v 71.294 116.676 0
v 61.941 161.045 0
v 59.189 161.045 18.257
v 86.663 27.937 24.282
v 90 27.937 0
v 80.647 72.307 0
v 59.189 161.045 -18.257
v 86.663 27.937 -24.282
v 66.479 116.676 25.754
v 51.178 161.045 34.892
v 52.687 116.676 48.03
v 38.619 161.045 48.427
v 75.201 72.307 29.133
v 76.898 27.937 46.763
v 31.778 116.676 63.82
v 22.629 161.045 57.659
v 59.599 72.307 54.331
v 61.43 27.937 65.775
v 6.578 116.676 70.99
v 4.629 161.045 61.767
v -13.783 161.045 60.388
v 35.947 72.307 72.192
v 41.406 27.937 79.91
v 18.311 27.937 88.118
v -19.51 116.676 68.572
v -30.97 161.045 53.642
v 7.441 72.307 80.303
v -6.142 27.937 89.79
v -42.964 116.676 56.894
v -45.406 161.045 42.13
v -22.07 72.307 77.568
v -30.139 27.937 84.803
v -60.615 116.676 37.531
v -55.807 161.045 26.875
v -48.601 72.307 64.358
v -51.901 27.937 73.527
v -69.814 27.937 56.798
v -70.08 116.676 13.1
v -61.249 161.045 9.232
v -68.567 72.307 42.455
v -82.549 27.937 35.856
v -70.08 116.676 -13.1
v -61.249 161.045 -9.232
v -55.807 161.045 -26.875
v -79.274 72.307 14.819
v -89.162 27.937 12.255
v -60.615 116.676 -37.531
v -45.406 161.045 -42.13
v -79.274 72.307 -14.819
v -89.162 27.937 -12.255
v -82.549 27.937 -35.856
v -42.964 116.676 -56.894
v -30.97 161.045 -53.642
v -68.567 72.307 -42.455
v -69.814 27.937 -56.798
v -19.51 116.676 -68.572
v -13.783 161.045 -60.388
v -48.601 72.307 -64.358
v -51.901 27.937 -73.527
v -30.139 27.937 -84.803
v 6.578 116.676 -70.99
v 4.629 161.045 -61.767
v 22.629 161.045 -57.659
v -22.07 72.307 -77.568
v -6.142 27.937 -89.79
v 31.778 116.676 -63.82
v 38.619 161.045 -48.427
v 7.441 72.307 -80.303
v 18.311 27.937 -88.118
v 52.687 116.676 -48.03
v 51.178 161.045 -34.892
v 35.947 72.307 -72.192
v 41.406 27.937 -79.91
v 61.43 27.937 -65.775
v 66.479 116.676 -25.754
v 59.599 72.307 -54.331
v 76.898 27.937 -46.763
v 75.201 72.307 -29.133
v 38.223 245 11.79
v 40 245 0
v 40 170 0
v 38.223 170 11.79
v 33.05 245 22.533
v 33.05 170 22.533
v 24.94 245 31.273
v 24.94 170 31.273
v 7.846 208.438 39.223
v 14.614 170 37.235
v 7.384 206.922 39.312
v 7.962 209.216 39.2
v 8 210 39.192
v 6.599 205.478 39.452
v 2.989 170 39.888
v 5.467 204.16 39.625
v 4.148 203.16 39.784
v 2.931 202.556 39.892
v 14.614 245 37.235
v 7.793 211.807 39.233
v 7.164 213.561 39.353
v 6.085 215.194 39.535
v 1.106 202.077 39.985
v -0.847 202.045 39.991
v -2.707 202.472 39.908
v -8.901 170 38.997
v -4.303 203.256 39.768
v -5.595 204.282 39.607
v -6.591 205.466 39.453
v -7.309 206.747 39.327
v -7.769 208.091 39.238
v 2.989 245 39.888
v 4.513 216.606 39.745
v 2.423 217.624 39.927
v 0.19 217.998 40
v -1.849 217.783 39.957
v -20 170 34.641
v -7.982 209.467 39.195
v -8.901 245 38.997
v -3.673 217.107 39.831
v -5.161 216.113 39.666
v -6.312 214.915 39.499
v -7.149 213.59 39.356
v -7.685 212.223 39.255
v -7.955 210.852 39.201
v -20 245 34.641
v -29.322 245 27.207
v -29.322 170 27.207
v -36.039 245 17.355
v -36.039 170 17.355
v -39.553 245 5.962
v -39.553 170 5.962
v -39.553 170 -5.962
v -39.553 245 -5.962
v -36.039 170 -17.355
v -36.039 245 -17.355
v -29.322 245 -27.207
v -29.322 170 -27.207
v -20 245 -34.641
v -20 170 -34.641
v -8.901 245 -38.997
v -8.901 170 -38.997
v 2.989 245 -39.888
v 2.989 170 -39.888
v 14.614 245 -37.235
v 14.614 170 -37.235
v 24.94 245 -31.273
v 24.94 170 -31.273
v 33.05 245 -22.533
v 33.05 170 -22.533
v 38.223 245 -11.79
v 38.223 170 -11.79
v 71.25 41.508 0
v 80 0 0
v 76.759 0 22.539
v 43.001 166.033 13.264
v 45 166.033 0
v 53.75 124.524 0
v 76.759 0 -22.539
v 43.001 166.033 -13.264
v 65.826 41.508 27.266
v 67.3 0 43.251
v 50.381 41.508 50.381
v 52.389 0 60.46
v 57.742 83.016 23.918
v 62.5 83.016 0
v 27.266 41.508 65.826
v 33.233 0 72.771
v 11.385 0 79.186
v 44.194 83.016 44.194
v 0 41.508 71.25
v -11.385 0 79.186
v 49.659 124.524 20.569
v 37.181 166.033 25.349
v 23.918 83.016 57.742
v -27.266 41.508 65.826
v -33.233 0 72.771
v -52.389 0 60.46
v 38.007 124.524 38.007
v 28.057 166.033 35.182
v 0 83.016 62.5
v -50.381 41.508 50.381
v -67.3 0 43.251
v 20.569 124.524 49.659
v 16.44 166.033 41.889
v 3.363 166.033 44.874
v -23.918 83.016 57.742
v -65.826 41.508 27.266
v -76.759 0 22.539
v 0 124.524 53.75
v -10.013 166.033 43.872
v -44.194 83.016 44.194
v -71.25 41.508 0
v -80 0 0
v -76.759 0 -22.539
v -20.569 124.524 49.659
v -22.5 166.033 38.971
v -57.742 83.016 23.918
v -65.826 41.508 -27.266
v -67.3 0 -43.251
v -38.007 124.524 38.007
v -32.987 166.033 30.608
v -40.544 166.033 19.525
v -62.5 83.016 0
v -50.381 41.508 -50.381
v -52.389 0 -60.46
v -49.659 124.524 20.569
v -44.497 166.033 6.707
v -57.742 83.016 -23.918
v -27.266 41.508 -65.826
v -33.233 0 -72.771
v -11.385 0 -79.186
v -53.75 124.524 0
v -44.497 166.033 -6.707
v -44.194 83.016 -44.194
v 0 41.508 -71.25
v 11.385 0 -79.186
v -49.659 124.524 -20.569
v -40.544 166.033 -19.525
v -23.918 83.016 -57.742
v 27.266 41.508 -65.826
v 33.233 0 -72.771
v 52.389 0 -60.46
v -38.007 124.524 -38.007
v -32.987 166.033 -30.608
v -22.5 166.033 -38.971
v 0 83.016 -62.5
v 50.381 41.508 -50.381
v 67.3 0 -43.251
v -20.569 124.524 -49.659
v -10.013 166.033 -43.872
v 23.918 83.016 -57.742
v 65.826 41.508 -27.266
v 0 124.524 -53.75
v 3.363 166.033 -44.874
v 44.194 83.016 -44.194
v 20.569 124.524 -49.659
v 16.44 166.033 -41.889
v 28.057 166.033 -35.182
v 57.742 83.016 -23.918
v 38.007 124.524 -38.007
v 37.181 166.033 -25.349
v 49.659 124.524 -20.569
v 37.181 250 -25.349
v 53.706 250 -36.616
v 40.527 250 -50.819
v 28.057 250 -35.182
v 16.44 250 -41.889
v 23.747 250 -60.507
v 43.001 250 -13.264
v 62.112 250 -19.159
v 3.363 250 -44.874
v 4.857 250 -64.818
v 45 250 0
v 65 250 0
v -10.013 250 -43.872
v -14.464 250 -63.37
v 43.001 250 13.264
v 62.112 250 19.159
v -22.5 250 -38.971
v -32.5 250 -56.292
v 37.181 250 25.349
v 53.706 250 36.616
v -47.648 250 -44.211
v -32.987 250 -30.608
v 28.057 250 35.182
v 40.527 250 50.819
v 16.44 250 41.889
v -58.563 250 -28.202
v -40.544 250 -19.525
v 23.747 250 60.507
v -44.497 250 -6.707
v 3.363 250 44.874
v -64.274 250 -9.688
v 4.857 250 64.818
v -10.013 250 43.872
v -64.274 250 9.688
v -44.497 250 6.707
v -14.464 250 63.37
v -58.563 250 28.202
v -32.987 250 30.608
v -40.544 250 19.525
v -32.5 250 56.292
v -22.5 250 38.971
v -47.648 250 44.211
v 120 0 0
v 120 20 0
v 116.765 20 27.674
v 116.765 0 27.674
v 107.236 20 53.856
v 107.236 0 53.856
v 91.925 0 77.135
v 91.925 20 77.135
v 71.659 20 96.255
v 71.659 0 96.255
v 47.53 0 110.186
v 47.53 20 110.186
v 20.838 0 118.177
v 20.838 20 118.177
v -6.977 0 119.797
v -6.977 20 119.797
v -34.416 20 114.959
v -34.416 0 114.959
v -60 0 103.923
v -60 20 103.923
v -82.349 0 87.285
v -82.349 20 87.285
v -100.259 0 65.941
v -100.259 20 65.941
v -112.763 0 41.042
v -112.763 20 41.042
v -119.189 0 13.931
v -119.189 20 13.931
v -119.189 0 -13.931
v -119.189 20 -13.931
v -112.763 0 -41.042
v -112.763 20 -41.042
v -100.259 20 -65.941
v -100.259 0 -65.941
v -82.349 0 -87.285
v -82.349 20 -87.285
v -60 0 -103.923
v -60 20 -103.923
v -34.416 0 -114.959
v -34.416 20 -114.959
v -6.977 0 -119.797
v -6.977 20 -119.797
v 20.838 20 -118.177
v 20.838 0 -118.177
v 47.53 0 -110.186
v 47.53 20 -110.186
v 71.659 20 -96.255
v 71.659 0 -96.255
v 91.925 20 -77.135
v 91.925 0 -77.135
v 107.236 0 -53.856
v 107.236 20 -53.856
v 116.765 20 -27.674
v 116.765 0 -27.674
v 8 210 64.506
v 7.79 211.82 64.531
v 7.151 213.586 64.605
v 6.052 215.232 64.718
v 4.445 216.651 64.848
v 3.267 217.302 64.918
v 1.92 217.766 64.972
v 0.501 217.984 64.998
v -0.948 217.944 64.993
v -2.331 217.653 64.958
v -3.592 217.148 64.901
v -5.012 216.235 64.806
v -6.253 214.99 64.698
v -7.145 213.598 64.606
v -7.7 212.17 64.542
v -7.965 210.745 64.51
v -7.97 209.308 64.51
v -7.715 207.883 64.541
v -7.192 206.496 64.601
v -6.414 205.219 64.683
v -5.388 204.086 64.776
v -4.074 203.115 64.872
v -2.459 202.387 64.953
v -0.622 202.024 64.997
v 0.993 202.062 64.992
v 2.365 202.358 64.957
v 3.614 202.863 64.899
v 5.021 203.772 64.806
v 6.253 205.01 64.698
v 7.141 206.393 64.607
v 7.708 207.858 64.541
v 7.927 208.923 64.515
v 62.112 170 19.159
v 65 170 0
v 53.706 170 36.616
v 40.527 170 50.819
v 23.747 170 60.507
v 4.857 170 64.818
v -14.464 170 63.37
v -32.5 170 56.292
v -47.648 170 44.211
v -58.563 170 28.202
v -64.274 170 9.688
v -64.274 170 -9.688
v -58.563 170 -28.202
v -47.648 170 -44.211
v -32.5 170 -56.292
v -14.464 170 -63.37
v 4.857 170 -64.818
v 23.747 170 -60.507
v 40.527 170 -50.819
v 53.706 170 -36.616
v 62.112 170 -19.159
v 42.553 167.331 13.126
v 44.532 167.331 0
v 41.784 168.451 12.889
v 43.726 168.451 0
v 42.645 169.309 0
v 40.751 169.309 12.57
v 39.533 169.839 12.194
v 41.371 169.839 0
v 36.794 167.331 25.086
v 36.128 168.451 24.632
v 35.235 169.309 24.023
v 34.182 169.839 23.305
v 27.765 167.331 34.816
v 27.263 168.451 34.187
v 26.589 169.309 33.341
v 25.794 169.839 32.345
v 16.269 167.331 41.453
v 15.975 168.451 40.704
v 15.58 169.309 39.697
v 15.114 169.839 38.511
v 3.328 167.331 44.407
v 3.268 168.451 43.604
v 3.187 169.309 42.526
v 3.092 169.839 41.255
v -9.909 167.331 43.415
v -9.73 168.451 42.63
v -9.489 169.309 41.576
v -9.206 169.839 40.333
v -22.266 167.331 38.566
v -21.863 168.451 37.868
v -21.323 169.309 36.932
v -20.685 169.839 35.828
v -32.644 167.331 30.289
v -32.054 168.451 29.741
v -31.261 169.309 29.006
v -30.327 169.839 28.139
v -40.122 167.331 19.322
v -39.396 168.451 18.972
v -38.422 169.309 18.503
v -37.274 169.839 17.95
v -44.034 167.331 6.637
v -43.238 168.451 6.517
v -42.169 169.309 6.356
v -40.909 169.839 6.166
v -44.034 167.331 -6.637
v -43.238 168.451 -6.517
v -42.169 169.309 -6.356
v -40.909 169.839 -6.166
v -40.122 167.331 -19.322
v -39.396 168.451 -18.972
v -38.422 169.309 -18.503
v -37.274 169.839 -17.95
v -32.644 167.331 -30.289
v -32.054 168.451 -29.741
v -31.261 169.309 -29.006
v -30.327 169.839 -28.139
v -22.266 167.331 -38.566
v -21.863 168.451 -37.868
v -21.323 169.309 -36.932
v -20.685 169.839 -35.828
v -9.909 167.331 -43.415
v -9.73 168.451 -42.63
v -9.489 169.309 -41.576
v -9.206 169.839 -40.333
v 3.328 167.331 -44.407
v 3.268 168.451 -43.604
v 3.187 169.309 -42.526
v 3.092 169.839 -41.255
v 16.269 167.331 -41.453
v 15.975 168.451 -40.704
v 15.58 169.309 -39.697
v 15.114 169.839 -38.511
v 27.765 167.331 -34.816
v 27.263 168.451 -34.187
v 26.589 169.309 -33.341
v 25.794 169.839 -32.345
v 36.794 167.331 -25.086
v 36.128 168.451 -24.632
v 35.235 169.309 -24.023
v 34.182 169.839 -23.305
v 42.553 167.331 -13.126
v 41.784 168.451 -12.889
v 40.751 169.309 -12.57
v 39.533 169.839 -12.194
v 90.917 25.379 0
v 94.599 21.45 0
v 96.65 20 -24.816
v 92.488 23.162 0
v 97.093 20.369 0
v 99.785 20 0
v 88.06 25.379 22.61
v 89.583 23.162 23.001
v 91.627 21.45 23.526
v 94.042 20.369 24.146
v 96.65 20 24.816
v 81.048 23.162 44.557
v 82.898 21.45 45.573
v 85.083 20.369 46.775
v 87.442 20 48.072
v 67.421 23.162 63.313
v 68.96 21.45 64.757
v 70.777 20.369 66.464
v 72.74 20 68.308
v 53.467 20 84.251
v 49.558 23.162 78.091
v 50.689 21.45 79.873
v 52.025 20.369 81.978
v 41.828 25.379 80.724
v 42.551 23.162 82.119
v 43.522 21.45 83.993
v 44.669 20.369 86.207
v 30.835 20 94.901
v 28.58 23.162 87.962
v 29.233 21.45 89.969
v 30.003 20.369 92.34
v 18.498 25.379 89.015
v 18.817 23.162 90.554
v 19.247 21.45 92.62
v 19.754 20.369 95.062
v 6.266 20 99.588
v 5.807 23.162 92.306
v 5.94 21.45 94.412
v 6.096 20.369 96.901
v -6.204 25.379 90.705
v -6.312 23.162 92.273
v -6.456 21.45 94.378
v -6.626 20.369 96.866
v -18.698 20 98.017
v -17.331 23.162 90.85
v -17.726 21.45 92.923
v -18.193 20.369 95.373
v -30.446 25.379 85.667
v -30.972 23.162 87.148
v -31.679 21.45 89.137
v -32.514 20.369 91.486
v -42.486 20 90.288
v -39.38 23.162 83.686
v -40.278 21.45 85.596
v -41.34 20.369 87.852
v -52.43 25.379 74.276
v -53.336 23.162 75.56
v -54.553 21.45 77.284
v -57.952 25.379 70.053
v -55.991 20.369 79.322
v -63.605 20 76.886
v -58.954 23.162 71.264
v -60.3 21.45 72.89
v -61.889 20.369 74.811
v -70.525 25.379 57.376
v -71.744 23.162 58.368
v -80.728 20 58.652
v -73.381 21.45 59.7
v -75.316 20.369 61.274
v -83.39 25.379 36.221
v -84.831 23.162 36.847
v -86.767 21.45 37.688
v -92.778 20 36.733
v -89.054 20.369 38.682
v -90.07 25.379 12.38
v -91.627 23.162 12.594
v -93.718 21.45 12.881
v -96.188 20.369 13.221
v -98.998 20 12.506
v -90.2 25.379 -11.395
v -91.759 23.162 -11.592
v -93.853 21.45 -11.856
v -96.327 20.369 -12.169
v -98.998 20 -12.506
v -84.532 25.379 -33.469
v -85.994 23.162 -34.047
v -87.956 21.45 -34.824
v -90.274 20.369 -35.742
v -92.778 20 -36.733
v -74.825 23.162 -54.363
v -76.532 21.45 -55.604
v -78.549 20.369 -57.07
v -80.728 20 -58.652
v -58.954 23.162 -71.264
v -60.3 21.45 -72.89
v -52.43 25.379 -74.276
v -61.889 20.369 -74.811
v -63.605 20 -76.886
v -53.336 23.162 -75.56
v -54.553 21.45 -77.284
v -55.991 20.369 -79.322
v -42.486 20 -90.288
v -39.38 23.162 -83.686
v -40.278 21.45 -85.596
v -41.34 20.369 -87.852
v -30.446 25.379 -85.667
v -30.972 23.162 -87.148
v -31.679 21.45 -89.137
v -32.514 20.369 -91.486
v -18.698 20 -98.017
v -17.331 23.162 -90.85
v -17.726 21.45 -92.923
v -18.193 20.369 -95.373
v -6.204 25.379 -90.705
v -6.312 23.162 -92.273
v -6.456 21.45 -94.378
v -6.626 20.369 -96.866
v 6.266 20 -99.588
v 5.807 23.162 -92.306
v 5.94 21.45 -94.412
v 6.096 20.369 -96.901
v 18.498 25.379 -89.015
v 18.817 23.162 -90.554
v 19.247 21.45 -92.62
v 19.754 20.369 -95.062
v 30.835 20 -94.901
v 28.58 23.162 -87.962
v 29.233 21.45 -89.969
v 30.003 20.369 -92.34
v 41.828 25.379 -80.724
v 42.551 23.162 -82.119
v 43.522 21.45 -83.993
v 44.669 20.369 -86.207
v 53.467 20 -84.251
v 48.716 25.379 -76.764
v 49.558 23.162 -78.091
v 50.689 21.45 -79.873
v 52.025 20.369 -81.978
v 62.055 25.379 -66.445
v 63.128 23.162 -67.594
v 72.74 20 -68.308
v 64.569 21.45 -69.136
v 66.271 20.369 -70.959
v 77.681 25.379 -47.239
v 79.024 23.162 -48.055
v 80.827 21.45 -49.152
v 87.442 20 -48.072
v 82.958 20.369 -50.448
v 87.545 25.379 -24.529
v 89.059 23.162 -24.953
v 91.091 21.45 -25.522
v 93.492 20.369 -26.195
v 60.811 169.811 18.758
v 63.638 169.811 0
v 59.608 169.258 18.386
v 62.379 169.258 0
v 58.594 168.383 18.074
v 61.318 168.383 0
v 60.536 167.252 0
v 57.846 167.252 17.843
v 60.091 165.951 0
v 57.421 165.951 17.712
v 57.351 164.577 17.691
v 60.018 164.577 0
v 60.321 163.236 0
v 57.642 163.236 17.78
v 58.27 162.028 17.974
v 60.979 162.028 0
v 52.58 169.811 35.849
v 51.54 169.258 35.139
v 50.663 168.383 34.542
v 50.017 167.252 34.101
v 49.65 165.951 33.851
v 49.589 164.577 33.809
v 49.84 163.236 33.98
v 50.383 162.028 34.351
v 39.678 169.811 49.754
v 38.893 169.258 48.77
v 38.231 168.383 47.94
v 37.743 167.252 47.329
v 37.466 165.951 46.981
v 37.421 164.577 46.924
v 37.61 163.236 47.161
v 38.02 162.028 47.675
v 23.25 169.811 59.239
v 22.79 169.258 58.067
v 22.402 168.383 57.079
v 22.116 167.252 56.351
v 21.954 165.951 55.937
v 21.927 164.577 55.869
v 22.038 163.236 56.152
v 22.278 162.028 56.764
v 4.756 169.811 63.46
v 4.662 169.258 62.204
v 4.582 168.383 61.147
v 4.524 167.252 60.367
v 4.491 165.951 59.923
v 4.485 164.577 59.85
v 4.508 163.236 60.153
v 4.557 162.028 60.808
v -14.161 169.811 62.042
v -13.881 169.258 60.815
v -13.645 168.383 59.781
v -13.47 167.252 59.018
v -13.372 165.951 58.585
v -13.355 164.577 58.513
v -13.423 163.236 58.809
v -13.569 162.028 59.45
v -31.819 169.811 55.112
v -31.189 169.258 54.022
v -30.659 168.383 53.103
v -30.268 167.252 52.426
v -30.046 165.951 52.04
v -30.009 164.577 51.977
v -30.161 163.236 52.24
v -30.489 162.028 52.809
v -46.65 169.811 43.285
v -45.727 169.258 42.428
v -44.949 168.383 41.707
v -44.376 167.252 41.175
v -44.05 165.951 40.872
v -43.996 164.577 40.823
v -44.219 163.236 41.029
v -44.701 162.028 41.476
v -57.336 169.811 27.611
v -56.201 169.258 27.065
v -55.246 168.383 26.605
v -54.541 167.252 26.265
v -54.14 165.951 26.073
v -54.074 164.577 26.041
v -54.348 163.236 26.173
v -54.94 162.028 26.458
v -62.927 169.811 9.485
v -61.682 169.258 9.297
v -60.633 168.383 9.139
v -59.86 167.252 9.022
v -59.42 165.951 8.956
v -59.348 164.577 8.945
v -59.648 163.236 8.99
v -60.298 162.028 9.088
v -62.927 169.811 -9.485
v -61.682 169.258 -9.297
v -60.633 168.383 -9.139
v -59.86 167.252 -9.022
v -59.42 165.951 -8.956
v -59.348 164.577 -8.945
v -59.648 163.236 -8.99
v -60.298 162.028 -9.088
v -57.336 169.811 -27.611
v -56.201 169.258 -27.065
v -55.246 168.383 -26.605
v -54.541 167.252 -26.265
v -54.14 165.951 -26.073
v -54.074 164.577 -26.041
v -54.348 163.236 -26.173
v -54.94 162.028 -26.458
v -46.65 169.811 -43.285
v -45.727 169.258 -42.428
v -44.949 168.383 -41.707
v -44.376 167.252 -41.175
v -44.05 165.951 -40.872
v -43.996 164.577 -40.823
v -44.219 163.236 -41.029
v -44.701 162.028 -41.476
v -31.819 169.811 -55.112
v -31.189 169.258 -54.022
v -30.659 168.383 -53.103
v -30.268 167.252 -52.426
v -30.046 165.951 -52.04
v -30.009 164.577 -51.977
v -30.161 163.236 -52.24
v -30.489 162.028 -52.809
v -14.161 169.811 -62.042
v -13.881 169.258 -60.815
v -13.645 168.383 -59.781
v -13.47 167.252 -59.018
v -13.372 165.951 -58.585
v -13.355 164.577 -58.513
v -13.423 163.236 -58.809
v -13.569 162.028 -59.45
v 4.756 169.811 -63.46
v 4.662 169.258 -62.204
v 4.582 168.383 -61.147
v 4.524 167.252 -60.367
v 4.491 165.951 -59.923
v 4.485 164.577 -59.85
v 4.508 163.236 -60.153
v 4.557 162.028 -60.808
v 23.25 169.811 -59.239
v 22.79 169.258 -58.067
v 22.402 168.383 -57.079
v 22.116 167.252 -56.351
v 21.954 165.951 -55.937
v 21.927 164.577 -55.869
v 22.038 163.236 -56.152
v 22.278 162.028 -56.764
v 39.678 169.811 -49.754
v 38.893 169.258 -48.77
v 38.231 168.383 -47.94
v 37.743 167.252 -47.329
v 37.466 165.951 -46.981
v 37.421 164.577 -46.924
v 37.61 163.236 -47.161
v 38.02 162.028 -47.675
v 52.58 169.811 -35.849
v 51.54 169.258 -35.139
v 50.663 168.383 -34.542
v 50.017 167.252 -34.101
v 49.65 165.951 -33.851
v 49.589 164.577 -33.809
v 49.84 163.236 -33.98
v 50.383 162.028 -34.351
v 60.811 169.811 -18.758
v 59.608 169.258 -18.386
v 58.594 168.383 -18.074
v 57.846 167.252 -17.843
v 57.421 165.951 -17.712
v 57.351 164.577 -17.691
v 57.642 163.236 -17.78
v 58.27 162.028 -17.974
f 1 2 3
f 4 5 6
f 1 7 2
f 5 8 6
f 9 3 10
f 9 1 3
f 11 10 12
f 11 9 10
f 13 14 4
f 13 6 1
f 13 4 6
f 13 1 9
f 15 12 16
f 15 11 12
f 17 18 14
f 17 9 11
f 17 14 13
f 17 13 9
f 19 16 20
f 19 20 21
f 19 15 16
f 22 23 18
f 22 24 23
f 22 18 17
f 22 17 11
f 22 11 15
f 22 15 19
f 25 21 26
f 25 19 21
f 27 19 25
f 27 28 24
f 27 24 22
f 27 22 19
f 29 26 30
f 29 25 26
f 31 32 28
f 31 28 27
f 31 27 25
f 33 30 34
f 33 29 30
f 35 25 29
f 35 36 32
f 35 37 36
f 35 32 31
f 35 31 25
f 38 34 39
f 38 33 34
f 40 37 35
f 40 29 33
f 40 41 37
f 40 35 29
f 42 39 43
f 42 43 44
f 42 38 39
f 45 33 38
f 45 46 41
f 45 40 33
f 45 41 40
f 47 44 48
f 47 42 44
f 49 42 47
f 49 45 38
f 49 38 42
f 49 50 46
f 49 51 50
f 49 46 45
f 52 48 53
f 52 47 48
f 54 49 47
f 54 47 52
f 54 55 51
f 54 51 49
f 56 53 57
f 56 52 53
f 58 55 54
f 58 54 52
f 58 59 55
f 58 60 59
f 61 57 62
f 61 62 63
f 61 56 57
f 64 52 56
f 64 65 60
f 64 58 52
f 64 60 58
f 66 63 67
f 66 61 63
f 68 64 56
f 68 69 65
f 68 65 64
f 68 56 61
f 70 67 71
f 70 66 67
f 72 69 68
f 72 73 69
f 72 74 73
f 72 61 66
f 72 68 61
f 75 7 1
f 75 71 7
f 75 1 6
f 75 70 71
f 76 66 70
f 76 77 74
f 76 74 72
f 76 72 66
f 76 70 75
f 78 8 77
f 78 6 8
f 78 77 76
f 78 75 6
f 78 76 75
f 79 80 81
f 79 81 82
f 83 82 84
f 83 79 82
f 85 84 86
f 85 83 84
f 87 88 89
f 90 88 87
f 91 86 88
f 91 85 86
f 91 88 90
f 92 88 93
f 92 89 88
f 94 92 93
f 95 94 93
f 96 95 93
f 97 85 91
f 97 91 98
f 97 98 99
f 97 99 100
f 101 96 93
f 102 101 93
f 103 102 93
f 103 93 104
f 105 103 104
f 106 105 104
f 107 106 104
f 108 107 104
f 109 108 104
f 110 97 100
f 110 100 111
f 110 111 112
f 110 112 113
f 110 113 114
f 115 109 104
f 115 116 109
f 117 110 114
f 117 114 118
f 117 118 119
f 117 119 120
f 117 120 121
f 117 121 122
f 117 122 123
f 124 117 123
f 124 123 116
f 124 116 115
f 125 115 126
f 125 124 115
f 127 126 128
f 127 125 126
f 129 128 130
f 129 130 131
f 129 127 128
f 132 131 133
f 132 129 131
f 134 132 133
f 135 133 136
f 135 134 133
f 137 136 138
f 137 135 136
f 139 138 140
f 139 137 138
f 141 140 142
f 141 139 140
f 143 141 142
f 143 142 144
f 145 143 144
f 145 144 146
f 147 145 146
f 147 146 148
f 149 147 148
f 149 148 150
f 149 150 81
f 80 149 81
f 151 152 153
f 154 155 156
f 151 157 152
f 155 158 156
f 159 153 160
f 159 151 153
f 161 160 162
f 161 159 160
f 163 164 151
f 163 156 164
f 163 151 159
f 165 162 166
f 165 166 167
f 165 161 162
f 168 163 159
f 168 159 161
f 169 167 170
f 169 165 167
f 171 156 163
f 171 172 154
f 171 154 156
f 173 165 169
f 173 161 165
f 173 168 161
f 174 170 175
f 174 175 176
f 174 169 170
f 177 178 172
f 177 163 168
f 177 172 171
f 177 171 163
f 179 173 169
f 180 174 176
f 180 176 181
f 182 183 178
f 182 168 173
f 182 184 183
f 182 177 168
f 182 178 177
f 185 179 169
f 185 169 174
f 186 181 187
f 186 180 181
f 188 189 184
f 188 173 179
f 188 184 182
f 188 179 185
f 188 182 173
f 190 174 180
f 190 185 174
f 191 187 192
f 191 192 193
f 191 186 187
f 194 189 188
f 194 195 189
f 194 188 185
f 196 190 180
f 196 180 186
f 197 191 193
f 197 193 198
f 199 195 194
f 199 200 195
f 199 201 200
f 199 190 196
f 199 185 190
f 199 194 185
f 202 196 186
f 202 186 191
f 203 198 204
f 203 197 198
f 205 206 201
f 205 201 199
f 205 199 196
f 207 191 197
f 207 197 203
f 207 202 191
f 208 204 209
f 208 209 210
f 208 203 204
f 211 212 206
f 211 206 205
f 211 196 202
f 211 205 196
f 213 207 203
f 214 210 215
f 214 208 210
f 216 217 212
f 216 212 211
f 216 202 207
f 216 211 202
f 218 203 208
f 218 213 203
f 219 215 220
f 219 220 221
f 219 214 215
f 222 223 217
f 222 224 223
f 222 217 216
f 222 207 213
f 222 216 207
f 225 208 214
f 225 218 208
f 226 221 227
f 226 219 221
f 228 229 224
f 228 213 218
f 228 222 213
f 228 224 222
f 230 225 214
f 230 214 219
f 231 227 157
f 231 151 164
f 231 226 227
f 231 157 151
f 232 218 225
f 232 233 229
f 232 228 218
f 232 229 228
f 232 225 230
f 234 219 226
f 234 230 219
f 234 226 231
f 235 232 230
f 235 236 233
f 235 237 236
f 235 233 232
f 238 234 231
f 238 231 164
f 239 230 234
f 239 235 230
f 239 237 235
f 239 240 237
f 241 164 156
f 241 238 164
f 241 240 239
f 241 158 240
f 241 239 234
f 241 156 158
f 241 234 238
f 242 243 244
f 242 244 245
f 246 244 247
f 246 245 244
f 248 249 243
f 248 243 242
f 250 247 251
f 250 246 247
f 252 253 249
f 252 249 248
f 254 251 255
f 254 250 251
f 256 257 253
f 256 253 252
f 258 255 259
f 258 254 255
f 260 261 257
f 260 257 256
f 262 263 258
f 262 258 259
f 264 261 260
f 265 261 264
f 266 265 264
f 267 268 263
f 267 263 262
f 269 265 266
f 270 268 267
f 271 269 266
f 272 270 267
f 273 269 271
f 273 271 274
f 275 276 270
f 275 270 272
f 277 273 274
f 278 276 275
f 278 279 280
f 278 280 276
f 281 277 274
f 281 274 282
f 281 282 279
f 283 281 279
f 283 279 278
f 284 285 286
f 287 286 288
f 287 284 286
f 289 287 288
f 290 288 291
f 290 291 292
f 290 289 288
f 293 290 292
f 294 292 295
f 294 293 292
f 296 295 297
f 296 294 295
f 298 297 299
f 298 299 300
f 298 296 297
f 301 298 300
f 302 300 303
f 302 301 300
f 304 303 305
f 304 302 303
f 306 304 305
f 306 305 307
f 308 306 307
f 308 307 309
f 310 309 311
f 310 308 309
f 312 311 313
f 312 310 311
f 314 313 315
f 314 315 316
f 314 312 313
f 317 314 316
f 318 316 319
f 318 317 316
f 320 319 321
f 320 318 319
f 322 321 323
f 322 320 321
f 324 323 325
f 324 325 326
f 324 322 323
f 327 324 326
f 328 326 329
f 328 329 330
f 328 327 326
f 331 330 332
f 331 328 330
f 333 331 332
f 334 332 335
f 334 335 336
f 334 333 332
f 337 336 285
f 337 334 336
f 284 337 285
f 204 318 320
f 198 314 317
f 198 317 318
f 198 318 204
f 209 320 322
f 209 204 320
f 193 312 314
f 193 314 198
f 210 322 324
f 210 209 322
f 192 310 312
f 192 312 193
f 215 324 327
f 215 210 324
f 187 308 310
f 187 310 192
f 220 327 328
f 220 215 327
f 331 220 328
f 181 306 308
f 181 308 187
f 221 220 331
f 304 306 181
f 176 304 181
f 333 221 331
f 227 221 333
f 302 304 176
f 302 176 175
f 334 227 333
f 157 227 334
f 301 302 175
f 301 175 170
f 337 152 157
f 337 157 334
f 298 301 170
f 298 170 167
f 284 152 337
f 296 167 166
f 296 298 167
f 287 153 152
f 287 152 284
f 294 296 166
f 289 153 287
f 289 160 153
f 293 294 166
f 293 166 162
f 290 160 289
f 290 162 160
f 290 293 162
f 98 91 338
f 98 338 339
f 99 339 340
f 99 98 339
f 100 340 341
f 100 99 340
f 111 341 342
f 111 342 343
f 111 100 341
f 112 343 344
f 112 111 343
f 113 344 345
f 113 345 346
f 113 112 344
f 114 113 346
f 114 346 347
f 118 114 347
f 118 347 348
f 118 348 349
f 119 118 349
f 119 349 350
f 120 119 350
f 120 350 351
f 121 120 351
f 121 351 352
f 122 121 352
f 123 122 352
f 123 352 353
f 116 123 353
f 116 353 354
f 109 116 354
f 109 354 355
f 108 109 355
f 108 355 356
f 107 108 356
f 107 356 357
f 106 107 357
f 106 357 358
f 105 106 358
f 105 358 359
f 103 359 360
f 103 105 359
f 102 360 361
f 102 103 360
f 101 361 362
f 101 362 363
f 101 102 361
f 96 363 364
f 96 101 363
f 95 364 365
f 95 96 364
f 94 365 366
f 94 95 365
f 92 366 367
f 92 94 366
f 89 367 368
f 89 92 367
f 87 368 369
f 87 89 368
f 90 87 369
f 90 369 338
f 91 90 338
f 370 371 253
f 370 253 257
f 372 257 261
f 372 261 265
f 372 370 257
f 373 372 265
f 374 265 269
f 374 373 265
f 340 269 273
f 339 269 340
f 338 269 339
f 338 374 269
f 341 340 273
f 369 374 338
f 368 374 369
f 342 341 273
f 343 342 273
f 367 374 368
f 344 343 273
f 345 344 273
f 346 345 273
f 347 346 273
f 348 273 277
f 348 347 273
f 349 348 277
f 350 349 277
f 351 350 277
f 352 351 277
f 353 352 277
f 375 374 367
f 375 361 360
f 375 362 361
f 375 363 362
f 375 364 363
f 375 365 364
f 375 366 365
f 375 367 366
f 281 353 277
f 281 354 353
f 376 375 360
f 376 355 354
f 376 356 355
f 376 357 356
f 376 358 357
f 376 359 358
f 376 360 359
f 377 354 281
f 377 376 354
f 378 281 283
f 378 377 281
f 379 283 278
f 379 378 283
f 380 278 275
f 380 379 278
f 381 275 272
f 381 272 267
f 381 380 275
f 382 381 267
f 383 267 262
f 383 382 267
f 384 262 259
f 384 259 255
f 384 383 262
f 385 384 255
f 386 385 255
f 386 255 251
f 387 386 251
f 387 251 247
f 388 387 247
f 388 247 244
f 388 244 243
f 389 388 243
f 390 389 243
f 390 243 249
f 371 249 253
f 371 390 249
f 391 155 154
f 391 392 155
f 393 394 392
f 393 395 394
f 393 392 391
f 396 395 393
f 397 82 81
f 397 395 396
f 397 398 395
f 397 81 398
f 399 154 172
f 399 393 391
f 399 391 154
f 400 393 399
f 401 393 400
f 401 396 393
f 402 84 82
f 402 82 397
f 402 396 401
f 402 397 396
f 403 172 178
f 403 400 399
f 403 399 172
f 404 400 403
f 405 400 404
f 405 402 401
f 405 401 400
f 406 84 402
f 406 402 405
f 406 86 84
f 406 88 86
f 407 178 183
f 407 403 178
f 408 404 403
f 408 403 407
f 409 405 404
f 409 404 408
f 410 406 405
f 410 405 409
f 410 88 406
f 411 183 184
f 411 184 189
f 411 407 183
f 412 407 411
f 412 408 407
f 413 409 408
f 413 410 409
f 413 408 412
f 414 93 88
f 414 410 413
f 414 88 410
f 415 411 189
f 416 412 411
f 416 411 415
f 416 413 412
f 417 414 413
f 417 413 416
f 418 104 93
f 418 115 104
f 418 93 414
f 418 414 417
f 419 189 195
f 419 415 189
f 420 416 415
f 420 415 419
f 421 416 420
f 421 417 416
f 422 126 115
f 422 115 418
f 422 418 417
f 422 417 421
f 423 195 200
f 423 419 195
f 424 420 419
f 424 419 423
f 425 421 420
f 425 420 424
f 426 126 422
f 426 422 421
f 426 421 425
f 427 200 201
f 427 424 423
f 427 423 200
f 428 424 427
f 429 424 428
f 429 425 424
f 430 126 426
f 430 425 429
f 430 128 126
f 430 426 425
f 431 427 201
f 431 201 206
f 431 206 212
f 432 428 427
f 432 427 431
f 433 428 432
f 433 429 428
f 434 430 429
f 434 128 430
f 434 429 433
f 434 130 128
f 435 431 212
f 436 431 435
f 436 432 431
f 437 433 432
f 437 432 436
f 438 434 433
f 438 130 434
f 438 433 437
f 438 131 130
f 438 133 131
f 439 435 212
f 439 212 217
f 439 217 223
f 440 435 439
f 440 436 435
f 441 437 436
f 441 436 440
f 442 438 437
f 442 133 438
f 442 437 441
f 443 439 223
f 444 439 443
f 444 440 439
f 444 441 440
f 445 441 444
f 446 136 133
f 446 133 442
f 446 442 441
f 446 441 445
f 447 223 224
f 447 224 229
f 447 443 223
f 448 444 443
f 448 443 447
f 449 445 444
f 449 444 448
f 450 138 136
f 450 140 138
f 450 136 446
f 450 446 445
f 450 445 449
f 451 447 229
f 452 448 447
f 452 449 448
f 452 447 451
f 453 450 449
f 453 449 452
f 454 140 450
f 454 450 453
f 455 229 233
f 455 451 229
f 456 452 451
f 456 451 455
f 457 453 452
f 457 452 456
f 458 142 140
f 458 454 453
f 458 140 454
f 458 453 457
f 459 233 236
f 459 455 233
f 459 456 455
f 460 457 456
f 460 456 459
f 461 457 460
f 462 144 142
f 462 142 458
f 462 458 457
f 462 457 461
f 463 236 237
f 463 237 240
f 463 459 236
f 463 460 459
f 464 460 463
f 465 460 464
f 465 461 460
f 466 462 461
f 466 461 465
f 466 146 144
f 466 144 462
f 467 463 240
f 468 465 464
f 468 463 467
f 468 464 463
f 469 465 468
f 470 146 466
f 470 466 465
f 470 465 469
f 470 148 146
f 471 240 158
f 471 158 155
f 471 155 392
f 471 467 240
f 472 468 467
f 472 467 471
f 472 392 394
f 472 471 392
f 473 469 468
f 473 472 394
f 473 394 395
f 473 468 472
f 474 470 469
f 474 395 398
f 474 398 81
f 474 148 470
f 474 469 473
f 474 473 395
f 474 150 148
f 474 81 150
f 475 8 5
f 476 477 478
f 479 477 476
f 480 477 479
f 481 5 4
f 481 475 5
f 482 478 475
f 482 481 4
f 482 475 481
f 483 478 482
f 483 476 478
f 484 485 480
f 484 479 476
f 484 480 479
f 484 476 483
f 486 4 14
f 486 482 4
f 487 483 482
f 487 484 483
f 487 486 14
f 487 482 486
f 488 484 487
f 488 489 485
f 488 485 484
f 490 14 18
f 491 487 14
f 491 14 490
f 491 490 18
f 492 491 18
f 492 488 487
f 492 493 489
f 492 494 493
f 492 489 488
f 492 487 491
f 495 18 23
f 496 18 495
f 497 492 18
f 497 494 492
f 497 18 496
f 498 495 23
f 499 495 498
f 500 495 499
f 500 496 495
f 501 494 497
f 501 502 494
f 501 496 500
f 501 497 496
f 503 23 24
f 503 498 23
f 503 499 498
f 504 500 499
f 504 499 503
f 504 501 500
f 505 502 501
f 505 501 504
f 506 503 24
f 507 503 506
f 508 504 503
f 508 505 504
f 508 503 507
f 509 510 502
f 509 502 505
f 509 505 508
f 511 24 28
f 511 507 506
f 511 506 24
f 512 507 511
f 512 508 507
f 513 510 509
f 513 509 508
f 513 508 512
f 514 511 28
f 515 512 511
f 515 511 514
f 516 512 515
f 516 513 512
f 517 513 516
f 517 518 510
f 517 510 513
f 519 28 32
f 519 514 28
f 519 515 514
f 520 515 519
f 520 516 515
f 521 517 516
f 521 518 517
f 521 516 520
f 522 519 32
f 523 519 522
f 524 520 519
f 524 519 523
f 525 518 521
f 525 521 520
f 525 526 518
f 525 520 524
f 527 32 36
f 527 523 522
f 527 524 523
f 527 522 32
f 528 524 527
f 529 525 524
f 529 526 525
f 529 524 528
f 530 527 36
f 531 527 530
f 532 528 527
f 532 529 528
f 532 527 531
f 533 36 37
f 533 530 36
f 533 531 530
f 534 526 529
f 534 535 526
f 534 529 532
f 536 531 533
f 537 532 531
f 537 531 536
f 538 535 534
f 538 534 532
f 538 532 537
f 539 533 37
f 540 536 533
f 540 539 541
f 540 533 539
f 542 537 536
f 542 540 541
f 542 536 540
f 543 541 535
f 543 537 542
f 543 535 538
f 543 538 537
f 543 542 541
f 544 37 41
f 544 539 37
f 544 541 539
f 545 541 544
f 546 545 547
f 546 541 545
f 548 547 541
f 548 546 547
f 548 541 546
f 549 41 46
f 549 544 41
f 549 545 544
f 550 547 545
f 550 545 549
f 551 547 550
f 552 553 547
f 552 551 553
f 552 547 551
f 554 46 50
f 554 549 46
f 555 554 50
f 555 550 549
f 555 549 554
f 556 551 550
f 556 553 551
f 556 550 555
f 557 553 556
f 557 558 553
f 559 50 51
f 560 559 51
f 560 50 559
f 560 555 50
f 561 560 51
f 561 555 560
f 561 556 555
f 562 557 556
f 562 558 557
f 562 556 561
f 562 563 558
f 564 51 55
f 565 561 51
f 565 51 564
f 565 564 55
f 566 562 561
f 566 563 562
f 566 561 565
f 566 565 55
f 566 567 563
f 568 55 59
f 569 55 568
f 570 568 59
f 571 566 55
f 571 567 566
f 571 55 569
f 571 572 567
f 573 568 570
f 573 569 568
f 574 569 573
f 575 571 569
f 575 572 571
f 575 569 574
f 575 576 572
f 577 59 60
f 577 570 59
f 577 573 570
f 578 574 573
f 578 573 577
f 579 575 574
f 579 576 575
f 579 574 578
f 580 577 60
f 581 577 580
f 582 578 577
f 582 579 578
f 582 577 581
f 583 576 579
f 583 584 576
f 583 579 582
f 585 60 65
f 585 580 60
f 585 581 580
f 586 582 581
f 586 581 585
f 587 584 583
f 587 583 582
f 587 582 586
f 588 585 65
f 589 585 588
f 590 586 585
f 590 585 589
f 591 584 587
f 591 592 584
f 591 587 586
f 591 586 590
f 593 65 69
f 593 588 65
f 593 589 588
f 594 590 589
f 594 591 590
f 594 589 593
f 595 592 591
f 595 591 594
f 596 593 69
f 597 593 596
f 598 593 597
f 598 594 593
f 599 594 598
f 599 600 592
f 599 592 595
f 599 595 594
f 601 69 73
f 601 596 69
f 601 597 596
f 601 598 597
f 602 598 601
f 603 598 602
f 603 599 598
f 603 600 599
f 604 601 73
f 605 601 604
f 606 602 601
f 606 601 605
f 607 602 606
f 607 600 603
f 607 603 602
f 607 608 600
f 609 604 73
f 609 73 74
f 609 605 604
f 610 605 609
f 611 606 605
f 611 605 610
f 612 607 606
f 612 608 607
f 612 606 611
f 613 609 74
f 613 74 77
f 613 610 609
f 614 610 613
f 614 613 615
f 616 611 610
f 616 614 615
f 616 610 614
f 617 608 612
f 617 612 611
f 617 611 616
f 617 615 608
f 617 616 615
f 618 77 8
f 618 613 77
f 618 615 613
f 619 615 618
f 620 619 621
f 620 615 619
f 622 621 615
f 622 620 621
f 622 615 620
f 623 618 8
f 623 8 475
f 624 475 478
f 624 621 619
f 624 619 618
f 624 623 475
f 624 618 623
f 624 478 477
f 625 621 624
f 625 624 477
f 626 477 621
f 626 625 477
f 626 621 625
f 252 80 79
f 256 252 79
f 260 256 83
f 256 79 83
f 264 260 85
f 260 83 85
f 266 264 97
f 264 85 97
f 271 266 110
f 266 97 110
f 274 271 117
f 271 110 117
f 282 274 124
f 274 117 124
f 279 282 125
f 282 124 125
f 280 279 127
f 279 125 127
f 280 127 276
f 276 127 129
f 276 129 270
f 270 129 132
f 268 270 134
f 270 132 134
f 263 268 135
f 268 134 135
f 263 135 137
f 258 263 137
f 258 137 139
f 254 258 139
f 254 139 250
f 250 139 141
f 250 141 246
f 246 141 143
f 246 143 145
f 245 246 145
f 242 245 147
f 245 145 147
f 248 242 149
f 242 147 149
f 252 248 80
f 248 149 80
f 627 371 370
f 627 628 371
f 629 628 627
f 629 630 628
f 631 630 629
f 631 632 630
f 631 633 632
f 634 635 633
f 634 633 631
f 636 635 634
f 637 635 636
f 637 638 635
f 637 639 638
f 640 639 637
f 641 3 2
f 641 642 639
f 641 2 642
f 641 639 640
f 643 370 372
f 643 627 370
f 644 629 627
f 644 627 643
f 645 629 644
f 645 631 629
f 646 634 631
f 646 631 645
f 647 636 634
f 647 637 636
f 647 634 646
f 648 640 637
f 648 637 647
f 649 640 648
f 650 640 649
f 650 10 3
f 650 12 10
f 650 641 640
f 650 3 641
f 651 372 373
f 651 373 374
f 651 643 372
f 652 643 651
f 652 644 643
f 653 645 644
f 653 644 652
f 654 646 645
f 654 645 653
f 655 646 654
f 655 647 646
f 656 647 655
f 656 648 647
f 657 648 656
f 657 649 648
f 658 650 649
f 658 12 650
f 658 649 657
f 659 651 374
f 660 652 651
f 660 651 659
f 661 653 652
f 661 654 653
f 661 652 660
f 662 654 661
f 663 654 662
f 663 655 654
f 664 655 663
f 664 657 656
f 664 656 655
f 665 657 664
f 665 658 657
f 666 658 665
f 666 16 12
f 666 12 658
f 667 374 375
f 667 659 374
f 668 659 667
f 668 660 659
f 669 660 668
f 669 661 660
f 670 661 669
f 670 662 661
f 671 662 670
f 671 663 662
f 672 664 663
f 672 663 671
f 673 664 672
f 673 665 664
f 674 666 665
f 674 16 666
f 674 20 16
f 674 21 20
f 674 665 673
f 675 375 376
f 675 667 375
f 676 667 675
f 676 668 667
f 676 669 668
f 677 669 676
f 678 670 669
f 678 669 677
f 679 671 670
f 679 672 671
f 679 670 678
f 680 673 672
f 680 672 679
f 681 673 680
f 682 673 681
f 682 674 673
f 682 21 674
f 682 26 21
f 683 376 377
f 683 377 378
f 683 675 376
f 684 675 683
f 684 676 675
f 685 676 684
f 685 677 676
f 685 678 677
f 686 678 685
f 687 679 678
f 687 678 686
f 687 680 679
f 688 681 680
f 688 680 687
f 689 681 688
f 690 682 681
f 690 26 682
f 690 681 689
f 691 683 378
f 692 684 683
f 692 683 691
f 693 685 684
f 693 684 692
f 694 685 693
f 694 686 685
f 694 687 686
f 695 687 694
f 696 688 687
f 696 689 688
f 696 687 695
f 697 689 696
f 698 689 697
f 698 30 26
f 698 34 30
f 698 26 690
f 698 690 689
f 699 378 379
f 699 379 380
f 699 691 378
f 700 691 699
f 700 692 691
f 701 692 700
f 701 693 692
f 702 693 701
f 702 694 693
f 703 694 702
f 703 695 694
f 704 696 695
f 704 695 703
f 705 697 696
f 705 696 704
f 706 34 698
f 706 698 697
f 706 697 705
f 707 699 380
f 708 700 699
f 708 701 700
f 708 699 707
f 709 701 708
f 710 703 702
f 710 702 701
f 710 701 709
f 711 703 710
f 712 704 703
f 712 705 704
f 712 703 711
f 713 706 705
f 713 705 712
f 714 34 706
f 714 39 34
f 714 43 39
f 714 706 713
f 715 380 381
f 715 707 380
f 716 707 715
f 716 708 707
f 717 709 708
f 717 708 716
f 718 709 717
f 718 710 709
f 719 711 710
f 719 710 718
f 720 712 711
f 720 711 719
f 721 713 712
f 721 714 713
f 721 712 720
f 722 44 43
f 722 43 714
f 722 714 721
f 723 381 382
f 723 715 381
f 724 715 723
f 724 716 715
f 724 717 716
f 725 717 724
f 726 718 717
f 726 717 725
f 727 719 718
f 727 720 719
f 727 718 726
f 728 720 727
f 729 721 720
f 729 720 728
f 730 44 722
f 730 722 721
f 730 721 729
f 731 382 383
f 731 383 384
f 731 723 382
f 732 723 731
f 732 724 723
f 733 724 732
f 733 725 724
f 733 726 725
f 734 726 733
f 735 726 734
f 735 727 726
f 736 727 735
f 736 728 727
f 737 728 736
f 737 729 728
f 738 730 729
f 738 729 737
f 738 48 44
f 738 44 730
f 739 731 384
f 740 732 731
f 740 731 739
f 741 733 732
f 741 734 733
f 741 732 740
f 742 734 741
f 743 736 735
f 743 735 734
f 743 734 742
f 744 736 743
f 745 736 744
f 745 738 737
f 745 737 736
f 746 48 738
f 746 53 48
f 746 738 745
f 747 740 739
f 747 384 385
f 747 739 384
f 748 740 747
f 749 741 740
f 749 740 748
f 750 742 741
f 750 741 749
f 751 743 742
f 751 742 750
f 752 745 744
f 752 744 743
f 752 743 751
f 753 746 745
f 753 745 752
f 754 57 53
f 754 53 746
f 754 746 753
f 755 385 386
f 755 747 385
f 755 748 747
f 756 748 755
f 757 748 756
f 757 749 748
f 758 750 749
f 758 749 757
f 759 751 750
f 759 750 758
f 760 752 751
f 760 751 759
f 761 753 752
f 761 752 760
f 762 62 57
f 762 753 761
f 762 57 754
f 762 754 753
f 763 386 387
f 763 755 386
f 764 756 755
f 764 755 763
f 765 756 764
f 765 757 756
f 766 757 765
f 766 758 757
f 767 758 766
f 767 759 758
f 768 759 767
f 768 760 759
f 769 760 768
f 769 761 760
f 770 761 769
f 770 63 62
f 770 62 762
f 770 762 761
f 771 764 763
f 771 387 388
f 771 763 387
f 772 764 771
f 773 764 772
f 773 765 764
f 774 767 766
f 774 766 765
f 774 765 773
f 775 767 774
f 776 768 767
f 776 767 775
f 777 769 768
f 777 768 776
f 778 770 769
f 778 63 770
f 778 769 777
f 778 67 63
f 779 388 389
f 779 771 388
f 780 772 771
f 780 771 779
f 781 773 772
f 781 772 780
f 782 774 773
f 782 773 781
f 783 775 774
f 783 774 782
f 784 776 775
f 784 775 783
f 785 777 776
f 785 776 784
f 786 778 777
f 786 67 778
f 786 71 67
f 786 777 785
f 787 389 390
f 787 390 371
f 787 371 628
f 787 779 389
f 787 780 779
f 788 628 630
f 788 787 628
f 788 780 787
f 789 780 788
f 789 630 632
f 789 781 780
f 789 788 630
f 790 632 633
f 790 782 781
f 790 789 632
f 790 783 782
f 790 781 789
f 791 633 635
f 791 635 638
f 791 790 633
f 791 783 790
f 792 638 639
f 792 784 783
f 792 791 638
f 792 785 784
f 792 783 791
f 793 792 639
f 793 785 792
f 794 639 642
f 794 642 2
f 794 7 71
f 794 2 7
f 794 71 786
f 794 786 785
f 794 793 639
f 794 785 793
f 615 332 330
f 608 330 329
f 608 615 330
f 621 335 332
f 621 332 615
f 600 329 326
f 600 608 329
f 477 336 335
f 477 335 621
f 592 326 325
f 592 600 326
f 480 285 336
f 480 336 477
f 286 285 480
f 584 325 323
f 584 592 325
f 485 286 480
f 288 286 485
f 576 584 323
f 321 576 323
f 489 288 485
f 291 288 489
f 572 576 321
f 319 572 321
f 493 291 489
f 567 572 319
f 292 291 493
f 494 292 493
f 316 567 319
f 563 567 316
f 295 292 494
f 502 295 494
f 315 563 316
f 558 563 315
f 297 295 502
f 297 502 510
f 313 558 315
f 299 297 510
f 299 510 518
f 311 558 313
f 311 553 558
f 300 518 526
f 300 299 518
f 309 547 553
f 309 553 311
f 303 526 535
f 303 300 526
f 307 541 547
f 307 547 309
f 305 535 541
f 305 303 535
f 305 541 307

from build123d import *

# Parameters (mm, degrees)
CHAMFER1_SIZE      = 5
SKETCH2_R          = 8
CUT_EXTRUDE1_DEPTH = 120


with BuildPart() as part:
    # Sketch1 → Revolve1 (revolve)
    with BuildSketch(Plane.XY):
        with BuildLine():
            Line((40, 250), (65, 250))
            Line((65, 250), (65, 170))
            ThreePointArc((65, 170), (60.268530098, 166.616537216), (61.940561127, 161.045277028))
            Line((61.940561127, 161.045277028), (90, 27.937311241))
            ThreePointArc((90, 27.937311241), (93.485226827, 22.233826953), (99.784953504, 20))
            Line((99.784953504, 20), (120, 20))
            Line((120, 20), (120, 0))
            Line((120, 0), (80, 0))
            Line((80, 0), (45, 166.032500638))
            ThreePointArc((45, 166.032500638), (43.215449857, 168.917888595), (40, 170))
            Line((40, 170), (40, 250))
        make_face()
    revolve(axis=Axis((0, 107.637867538, 0), (0, -1, 0)))

    # Chamfer1
    chamfer1_edges = [part.edges().sort_by_distance(p)[0] for p in [
        (-40, 250, 0),
    ]]
    chamfer(chamfer1_edges, length=CHAMFER1_SIZE)

    # Sketch2 → Cut-Extrude1 (cut)
    with BuildSketch(Plane.XY):
        with Locations((0, 210)):
            Circle(SKETCH2_R)
    extrude(amount=CUT_EXTRUDE1_DEPTH, mode=Mode.SUBTRACT)


solid = part.part
